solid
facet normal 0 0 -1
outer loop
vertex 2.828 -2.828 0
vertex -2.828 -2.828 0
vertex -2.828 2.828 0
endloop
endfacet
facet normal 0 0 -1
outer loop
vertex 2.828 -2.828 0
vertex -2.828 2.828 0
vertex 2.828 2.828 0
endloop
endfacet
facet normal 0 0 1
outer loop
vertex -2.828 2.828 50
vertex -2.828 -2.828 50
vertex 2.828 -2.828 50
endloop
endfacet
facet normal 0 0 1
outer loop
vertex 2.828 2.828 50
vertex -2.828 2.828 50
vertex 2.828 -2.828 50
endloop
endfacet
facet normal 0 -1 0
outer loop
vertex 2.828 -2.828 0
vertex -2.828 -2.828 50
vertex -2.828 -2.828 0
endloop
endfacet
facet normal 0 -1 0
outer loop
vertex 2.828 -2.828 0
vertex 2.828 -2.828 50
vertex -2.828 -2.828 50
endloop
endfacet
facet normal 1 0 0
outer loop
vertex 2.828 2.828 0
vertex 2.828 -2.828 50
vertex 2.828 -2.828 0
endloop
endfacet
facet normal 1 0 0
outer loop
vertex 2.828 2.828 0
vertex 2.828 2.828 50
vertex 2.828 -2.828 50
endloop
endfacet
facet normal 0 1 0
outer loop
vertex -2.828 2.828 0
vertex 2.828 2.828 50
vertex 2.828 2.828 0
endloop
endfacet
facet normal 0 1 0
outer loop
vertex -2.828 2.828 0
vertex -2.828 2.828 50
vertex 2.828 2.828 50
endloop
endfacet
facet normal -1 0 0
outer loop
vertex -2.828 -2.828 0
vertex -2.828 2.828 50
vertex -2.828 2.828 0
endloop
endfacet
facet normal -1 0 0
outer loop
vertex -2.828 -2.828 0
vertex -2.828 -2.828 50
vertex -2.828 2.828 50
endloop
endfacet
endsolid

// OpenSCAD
// a special wall anchor with lost of adjustments
// (all sizes in millimenter)

module wall_anchor(
    drill_hole_dm = 8,  // drill hole diameter
    screw_dm = 5,       // screw diameter
    length = 50     // anchor length
) {
    side_length = sqrt( pow(drill_hole_dm, 2 ) / 2 );
    
    linear_extrude( height = length )
        square( side_length, center = true);
    }

wall_anchor();
